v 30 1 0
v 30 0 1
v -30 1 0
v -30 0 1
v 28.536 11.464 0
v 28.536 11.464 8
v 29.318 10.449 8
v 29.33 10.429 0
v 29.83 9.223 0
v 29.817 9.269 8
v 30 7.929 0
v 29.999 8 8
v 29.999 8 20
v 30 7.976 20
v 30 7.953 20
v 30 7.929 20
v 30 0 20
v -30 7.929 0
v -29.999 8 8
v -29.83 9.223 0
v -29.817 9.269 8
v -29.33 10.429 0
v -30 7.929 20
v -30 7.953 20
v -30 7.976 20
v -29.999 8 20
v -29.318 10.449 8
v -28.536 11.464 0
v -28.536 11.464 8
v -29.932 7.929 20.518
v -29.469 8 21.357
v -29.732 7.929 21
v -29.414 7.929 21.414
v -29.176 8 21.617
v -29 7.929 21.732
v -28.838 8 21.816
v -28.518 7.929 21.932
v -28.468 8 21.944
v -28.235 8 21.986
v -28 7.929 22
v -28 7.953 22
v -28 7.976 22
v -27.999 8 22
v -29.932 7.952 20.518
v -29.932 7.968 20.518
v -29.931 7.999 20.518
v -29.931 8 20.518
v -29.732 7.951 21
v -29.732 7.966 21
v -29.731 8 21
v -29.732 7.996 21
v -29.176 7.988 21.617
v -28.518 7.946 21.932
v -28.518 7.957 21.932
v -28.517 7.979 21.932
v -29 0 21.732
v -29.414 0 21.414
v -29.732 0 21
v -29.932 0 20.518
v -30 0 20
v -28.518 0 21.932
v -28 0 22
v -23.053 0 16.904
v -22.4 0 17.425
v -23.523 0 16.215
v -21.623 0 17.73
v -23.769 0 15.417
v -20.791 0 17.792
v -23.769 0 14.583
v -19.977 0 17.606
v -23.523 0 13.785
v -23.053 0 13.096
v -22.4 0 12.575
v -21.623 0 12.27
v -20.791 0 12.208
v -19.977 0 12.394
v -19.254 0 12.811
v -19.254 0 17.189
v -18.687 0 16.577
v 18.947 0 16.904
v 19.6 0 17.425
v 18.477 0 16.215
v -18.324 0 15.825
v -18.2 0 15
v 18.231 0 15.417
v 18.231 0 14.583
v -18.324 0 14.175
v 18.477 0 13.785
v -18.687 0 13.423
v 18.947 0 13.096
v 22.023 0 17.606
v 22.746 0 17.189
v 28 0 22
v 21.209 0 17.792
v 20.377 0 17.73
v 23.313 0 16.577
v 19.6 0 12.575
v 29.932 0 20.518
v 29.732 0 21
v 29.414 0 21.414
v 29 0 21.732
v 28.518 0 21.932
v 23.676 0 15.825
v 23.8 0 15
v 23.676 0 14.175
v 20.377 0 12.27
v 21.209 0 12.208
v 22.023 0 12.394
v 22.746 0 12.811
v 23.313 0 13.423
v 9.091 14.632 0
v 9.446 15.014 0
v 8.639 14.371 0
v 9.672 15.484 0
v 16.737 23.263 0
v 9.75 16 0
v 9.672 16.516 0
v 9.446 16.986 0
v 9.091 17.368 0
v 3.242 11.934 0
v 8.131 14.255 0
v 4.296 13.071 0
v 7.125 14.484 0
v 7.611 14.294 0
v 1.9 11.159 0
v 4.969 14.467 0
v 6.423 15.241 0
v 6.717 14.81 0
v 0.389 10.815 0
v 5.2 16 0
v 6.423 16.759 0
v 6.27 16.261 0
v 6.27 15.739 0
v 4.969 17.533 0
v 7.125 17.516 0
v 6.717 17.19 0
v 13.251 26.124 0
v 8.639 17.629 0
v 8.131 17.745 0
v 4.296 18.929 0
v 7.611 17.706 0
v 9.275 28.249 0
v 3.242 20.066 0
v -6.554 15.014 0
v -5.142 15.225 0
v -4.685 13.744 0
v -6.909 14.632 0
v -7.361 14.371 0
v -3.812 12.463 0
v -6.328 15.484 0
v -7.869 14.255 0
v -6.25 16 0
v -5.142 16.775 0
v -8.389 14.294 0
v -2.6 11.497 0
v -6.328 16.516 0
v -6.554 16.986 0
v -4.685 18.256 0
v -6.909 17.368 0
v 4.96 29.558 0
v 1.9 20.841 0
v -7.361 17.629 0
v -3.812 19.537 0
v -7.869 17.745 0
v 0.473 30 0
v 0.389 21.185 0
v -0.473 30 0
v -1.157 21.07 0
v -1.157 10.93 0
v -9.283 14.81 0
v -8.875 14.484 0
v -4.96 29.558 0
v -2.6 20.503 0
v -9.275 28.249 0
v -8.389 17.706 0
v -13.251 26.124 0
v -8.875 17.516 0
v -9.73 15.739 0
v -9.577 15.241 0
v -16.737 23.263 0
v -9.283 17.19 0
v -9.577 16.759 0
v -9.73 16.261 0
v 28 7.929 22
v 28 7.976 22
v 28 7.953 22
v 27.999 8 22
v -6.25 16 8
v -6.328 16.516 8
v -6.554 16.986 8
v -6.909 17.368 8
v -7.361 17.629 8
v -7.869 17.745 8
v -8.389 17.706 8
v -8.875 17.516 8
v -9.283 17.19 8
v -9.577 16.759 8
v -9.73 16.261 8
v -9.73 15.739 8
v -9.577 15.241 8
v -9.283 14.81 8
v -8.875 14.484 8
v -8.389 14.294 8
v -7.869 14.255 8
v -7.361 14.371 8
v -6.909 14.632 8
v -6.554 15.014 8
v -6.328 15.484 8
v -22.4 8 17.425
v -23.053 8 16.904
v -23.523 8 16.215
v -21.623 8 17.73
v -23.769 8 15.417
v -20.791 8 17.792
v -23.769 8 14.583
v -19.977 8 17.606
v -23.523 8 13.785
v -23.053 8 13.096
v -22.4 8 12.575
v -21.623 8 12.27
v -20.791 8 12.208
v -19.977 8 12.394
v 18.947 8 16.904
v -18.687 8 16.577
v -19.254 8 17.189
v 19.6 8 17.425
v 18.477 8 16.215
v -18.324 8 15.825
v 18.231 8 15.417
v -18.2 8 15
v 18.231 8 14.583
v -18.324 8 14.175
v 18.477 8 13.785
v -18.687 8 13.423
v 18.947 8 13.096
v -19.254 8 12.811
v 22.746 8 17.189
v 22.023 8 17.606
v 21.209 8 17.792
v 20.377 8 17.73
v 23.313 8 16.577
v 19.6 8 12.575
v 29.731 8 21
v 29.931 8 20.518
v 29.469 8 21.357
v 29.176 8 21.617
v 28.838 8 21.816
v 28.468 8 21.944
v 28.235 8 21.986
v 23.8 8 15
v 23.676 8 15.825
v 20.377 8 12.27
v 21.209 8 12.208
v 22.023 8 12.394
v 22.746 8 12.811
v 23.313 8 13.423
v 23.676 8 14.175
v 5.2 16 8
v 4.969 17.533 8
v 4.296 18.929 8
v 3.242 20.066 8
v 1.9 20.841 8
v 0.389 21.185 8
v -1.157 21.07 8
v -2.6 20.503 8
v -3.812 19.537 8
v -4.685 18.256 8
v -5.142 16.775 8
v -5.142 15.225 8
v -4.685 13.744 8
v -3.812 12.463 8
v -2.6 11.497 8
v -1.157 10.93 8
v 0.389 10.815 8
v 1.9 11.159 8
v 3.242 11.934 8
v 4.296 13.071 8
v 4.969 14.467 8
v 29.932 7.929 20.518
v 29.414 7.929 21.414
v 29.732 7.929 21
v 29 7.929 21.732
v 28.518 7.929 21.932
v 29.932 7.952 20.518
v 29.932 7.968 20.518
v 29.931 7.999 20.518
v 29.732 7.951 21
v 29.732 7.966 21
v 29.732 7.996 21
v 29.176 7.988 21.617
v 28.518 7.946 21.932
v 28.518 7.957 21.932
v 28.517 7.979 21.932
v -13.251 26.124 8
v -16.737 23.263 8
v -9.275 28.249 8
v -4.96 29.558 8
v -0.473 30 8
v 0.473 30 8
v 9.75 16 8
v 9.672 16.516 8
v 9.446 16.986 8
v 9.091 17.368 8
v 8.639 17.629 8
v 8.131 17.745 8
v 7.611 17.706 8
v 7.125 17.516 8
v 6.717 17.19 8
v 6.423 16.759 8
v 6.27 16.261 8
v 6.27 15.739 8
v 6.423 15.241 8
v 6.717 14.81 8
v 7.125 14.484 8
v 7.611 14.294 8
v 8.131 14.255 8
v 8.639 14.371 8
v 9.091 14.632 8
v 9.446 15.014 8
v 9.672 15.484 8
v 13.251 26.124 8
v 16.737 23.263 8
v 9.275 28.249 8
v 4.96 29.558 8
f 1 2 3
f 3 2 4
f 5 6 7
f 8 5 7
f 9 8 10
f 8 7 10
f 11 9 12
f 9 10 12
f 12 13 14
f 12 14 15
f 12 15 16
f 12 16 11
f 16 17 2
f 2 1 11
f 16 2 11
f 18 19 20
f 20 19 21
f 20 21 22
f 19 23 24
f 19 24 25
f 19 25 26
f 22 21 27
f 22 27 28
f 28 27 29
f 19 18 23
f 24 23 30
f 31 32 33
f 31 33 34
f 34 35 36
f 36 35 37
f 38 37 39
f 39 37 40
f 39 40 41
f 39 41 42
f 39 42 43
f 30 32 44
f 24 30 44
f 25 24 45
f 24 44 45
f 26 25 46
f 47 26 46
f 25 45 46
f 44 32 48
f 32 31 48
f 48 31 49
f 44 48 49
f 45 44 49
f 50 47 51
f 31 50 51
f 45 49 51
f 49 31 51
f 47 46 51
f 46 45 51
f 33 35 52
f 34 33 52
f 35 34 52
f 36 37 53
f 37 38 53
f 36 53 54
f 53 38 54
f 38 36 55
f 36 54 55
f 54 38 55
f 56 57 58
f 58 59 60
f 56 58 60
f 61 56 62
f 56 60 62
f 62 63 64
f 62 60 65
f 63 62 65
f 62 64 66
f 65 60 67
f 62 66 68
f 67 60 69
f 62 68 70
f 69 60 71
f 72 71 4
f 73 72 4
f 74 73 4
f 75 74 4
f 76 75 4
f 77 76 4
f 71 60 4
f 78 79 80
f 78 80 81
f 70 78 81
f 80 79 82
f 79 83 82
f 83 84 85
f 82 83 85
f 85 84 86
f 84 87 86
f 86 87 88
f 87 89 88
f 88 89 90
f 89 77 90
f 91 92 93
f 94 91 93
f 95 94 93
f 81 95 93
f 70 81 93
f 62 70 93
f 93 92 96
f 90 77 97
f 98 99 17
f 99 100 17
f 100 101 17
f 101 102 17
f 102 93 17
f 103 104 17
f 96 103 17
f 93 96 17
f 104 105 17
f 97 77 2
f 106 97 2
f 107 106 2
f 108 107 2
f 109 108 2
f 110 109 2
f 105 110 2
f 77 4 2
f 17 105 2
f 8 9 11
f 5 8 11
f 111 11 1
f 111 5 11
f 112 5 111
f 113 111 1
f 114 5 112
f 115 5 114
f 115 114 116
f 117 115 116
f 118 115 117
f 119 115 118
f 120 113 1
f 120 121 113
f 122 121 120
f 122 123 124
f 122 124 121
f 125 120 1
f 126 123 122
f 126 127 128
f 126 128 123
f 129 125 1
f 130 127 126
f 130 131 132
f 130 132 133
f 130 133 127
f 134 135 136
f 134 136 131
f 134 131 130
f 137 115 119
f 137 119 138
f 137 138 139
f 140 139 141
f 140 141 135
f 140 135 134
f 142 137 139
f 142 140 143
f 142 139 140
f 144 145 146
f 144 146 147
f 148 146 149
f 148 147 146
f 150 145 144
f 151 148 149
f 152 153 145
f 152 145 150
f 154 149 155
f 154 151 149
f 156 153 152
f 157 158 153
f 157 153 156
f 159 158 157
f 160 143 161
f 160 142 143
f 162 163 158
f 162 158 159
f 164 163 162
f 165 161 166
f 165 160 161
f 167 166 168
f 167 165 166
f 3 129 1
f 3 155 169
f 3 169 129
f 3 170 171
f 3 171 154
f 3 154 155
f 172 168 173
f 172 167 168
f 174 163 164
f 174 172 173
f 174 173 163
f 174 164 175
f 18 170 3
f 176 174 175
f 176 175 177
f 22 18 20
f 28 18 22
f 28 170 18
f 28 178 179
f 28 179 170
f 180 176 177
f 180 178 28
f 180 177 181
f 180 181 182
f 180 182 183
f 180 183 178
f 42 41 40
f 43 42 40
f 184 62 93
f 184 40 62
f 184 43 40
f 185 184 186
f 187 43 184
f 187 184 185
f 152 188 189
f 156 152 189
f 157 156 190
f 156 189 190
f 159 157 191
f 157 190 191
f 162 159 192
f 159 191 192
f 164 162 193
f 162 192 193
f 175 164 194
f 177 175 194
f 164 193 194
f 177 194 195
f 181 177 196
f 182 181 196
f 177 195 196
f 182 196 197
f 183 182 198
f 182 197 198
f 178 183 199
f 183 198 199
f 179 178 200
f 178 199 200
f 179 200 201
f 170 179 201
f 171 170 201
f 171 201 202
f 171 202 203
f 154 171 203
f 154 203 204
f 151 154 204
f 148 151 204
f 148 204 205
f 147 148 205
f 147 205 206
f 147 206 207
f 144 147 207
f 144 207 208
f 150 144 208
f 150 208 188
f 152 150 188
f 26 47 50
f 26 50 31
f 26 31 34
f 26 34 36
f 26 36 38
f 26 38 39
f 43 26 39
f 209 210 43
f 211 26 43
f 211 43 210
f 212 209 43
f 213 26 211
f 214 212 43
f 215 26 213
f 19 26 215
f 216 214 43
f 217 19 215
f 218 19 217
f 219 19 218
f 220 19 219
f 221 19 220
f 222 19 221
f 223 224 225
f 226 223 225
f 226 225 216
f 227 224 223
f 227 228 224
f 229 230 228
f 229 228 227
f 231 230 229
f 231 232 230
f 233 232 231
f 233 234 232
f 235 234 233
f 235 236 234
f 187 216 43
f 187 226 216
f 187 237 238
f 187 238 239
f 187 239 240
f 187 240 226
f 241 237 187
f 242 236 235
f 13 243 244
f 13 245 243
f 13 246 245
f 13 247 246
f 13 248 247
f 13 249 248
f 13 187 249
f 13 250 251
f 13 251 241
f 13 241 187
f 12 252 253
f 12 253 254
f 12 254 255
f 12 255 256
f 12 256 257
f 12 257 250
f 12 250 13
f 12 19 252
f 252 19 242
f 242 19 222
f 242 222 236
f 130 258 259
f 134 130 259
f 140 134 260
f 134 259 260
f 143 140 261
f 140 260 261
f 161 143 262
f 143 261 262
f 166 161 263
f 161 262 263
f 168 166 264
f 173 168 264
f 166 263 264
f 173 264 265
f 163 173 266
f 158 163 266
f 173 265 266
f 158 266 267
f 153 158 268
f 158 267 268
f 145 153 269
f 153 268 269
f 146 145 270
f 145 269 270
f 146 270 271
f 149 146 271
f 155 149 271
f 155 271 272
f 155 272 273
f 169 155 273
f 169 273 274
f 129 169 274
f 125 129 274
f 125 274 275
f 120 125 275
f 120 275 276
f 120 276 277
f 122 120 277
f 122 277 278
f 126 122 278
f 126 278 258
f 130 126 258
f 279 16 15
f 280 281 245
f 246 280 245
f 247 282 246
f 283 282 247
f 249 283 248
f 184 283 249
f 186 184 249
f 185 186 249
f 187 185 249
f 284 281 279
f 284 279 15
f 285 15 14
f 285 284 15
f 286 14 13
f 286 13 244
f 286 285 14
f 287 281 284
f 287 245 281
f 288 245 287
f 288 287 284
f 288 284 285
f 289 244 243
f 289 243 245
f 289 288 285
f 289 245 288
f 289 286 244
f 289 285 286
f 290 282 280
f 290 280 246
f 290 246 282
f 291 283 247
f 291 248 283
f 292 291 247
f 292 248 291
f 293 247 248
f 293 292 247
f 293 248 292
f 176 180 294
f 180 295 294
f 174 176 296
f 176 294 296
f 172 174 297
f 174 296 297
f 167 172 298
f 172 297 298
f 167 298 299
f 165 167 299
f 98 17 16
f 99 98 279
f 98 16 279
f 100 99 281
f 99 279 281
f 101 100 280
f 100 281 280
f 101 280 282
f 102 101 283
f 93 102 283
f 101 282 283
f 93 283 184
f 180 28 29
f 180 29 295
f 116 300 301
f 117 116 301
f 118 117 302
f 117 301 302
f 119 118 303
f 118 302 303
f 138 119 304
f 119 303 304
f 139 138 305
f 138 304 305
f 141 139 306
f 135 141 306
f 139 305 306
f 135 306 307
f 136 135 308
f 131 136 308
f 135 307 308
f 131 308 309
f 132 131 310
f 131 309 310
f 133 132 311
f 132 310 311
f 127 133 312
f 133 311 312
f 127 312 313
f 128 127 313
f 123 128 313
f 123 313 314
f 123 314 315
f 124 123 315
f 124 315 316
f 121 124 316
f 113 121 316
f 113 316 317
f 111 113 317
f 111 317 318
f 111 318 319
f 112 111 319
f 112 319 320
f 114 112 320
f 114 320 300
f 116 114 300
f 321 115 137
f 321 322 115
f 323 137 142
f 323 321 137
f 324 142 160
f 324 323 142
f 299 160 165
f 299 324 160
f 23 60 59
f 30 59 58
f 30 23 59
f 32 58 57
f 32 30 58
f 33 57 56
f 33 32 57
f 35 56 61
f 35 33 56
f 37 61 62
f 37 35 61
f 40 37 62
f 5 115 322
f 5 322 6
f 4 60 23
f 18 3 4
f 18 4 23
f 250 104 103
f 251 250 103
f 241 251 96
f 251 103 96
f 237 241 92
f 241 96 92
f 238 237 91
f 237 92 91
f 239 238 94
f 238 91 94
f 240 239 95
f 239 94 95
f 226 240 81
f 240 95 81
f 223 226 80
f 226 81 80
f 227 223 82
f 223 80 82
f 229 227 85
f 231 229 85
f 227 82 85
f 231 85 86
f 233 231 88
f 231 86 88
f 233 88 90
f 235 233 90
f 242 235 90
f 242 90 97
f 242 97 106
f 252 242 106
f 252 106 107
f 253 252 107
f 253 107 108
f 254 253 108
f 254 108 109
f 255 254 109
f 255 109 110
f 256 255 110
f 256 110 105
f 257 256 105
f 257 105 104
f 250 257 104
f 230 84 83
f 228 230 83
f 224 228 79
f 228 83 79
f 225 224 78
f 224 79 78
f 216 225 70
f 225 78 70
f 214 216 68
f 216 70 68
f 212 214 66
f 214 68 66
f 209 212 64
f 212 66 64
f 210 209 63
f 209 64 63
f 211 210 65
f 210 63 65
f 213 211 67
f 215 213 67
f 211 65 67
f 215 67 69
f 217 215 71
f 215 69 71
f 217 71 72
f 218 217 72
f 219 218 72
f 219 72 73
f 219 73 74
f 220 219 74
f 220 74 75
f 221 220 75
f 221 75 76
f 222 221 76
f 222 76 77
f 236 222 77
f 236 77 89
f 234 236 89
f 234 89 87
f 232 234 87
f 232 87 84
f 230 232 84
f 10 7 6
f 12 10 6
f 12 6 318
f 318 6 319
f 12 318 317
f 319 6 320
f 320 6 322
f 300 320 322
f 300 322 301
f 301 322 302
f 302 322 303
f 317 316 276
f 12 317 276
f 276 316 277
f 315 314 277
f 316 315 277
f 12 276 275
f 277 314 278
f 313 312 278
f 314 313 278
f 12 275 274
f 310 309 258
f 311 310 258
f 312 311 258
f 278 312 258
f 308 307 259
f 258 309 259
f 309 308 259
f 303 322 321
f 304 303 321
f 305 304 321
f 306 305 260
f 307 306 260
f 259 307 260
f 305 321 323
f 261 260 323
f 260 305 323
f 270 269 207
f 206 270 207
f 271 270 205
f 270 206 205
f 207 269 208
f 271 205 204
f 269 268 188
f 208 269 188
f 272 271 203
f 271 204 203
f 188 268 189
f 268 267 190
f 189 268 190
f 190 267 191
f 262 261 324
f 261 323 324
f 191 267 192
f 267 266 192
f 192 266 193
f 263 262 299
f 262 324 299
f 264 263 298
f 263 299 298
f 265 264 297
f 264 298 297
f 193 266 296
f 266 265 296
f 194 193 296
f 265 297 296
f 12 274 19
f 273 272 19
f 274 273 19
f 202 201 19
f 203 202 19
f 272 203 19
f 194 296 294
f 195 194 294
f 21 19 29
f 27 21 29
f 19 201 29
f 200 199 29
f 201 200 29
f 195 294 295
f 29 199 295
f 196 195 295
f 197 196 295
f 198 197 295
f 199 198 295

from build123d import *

# Parameters (mm, degrees)
PAD_DEPTH       = 8
SKETCH001_R     = 5.2
SKETCH001_R_2   = 1.75
POCKET_DEPTH    = 8.001
SKETCH002_W     = 60
SKETCH002_H     = 8
PAD001_DEPTH    = 14
SKETCH003_R     = 2.8
POCKET001_DEPTH = 30.001
FILLET_R        = 23
FILLET001_R     = 5
CHAMFER_SIZE    = 1
FILLET002_R     = 2


with BuildPart() as part:
    # Sketch → Pad (new body)
    with BuildSketch(Plane.XY):
        Polygon((-30, 0), (-30, 10), (-10, 30), (10, 30), (30, 10), (30, 0), align=None)
    extrude(amount=PAD_DEPTH)

    # Sketch001 → Pocket (cut, through all)
    with BuildSketch(Plane.XY.offset(8)):
        with Locations((0, 16)):
            Circle(SKETCH001_R)
        with Locations((-8, 16)):
            Circle(SKETCH001_R_2)
        with Locations((8, 16)):
            Circle(SKETCH001_R_2)
    extrude(amount=-POCKET_DEPTH, mode=Mode.SUBTRACT)

    # Sketch002 → Pad001 (new body)
    with BuildSketch(Plane.XY.offset(8)):
        with Locations((0, 4)):
            Rectangle(SKETCH002_W, SKETCH002_H)
    extrude(amount=PAD001_DEPTH)

    # Sketch003 → Pocket001 (cut, through all)
    with BuildSketch(Plane.XZ):
        with Locations((-21, 15)):
            Circle(SKETCH003_R)
        with Locations((21, 15)):
            Circle(SKETCH003_R)
    extrude(amount=-POCKET001_DEPTH, mode=Mode.SUBTRACT)

    # Fillet
    fillet_edges = [part.edges().sort_by_distance(p)[0] for p in [
        (10, 30, 4),
        (-10, 30, 4),
    ]]
    fillet(fillet_edges, radius=FILLET_R)

    # Fillet001
    fillet001_edges = [part.edges().sort_by_distance(p)[0] for p in [
        (30, 10, 4),
        (-30, 10, 4),
    ]]
    fillet(fillet001_edges, radius=FILLET001_R)

    # Chamfer
    chamfer_edges = [part.edges().sort_by_distance(p)[0] for p in [
        (0, 0, 0),
    ]]
    chamfer(chamfer_edges, length=CHAMFER_SIZE)

    # Fillet002
    fillet002_edges = [part.edges().sort_by_distance(p)[0] for p in [
        (30, 3.964466, 22),
        (-30, 3.964466, 22),
    ]]
    fillet(fillet002_edges, radius=FILLET002_R)


solid = part.part
